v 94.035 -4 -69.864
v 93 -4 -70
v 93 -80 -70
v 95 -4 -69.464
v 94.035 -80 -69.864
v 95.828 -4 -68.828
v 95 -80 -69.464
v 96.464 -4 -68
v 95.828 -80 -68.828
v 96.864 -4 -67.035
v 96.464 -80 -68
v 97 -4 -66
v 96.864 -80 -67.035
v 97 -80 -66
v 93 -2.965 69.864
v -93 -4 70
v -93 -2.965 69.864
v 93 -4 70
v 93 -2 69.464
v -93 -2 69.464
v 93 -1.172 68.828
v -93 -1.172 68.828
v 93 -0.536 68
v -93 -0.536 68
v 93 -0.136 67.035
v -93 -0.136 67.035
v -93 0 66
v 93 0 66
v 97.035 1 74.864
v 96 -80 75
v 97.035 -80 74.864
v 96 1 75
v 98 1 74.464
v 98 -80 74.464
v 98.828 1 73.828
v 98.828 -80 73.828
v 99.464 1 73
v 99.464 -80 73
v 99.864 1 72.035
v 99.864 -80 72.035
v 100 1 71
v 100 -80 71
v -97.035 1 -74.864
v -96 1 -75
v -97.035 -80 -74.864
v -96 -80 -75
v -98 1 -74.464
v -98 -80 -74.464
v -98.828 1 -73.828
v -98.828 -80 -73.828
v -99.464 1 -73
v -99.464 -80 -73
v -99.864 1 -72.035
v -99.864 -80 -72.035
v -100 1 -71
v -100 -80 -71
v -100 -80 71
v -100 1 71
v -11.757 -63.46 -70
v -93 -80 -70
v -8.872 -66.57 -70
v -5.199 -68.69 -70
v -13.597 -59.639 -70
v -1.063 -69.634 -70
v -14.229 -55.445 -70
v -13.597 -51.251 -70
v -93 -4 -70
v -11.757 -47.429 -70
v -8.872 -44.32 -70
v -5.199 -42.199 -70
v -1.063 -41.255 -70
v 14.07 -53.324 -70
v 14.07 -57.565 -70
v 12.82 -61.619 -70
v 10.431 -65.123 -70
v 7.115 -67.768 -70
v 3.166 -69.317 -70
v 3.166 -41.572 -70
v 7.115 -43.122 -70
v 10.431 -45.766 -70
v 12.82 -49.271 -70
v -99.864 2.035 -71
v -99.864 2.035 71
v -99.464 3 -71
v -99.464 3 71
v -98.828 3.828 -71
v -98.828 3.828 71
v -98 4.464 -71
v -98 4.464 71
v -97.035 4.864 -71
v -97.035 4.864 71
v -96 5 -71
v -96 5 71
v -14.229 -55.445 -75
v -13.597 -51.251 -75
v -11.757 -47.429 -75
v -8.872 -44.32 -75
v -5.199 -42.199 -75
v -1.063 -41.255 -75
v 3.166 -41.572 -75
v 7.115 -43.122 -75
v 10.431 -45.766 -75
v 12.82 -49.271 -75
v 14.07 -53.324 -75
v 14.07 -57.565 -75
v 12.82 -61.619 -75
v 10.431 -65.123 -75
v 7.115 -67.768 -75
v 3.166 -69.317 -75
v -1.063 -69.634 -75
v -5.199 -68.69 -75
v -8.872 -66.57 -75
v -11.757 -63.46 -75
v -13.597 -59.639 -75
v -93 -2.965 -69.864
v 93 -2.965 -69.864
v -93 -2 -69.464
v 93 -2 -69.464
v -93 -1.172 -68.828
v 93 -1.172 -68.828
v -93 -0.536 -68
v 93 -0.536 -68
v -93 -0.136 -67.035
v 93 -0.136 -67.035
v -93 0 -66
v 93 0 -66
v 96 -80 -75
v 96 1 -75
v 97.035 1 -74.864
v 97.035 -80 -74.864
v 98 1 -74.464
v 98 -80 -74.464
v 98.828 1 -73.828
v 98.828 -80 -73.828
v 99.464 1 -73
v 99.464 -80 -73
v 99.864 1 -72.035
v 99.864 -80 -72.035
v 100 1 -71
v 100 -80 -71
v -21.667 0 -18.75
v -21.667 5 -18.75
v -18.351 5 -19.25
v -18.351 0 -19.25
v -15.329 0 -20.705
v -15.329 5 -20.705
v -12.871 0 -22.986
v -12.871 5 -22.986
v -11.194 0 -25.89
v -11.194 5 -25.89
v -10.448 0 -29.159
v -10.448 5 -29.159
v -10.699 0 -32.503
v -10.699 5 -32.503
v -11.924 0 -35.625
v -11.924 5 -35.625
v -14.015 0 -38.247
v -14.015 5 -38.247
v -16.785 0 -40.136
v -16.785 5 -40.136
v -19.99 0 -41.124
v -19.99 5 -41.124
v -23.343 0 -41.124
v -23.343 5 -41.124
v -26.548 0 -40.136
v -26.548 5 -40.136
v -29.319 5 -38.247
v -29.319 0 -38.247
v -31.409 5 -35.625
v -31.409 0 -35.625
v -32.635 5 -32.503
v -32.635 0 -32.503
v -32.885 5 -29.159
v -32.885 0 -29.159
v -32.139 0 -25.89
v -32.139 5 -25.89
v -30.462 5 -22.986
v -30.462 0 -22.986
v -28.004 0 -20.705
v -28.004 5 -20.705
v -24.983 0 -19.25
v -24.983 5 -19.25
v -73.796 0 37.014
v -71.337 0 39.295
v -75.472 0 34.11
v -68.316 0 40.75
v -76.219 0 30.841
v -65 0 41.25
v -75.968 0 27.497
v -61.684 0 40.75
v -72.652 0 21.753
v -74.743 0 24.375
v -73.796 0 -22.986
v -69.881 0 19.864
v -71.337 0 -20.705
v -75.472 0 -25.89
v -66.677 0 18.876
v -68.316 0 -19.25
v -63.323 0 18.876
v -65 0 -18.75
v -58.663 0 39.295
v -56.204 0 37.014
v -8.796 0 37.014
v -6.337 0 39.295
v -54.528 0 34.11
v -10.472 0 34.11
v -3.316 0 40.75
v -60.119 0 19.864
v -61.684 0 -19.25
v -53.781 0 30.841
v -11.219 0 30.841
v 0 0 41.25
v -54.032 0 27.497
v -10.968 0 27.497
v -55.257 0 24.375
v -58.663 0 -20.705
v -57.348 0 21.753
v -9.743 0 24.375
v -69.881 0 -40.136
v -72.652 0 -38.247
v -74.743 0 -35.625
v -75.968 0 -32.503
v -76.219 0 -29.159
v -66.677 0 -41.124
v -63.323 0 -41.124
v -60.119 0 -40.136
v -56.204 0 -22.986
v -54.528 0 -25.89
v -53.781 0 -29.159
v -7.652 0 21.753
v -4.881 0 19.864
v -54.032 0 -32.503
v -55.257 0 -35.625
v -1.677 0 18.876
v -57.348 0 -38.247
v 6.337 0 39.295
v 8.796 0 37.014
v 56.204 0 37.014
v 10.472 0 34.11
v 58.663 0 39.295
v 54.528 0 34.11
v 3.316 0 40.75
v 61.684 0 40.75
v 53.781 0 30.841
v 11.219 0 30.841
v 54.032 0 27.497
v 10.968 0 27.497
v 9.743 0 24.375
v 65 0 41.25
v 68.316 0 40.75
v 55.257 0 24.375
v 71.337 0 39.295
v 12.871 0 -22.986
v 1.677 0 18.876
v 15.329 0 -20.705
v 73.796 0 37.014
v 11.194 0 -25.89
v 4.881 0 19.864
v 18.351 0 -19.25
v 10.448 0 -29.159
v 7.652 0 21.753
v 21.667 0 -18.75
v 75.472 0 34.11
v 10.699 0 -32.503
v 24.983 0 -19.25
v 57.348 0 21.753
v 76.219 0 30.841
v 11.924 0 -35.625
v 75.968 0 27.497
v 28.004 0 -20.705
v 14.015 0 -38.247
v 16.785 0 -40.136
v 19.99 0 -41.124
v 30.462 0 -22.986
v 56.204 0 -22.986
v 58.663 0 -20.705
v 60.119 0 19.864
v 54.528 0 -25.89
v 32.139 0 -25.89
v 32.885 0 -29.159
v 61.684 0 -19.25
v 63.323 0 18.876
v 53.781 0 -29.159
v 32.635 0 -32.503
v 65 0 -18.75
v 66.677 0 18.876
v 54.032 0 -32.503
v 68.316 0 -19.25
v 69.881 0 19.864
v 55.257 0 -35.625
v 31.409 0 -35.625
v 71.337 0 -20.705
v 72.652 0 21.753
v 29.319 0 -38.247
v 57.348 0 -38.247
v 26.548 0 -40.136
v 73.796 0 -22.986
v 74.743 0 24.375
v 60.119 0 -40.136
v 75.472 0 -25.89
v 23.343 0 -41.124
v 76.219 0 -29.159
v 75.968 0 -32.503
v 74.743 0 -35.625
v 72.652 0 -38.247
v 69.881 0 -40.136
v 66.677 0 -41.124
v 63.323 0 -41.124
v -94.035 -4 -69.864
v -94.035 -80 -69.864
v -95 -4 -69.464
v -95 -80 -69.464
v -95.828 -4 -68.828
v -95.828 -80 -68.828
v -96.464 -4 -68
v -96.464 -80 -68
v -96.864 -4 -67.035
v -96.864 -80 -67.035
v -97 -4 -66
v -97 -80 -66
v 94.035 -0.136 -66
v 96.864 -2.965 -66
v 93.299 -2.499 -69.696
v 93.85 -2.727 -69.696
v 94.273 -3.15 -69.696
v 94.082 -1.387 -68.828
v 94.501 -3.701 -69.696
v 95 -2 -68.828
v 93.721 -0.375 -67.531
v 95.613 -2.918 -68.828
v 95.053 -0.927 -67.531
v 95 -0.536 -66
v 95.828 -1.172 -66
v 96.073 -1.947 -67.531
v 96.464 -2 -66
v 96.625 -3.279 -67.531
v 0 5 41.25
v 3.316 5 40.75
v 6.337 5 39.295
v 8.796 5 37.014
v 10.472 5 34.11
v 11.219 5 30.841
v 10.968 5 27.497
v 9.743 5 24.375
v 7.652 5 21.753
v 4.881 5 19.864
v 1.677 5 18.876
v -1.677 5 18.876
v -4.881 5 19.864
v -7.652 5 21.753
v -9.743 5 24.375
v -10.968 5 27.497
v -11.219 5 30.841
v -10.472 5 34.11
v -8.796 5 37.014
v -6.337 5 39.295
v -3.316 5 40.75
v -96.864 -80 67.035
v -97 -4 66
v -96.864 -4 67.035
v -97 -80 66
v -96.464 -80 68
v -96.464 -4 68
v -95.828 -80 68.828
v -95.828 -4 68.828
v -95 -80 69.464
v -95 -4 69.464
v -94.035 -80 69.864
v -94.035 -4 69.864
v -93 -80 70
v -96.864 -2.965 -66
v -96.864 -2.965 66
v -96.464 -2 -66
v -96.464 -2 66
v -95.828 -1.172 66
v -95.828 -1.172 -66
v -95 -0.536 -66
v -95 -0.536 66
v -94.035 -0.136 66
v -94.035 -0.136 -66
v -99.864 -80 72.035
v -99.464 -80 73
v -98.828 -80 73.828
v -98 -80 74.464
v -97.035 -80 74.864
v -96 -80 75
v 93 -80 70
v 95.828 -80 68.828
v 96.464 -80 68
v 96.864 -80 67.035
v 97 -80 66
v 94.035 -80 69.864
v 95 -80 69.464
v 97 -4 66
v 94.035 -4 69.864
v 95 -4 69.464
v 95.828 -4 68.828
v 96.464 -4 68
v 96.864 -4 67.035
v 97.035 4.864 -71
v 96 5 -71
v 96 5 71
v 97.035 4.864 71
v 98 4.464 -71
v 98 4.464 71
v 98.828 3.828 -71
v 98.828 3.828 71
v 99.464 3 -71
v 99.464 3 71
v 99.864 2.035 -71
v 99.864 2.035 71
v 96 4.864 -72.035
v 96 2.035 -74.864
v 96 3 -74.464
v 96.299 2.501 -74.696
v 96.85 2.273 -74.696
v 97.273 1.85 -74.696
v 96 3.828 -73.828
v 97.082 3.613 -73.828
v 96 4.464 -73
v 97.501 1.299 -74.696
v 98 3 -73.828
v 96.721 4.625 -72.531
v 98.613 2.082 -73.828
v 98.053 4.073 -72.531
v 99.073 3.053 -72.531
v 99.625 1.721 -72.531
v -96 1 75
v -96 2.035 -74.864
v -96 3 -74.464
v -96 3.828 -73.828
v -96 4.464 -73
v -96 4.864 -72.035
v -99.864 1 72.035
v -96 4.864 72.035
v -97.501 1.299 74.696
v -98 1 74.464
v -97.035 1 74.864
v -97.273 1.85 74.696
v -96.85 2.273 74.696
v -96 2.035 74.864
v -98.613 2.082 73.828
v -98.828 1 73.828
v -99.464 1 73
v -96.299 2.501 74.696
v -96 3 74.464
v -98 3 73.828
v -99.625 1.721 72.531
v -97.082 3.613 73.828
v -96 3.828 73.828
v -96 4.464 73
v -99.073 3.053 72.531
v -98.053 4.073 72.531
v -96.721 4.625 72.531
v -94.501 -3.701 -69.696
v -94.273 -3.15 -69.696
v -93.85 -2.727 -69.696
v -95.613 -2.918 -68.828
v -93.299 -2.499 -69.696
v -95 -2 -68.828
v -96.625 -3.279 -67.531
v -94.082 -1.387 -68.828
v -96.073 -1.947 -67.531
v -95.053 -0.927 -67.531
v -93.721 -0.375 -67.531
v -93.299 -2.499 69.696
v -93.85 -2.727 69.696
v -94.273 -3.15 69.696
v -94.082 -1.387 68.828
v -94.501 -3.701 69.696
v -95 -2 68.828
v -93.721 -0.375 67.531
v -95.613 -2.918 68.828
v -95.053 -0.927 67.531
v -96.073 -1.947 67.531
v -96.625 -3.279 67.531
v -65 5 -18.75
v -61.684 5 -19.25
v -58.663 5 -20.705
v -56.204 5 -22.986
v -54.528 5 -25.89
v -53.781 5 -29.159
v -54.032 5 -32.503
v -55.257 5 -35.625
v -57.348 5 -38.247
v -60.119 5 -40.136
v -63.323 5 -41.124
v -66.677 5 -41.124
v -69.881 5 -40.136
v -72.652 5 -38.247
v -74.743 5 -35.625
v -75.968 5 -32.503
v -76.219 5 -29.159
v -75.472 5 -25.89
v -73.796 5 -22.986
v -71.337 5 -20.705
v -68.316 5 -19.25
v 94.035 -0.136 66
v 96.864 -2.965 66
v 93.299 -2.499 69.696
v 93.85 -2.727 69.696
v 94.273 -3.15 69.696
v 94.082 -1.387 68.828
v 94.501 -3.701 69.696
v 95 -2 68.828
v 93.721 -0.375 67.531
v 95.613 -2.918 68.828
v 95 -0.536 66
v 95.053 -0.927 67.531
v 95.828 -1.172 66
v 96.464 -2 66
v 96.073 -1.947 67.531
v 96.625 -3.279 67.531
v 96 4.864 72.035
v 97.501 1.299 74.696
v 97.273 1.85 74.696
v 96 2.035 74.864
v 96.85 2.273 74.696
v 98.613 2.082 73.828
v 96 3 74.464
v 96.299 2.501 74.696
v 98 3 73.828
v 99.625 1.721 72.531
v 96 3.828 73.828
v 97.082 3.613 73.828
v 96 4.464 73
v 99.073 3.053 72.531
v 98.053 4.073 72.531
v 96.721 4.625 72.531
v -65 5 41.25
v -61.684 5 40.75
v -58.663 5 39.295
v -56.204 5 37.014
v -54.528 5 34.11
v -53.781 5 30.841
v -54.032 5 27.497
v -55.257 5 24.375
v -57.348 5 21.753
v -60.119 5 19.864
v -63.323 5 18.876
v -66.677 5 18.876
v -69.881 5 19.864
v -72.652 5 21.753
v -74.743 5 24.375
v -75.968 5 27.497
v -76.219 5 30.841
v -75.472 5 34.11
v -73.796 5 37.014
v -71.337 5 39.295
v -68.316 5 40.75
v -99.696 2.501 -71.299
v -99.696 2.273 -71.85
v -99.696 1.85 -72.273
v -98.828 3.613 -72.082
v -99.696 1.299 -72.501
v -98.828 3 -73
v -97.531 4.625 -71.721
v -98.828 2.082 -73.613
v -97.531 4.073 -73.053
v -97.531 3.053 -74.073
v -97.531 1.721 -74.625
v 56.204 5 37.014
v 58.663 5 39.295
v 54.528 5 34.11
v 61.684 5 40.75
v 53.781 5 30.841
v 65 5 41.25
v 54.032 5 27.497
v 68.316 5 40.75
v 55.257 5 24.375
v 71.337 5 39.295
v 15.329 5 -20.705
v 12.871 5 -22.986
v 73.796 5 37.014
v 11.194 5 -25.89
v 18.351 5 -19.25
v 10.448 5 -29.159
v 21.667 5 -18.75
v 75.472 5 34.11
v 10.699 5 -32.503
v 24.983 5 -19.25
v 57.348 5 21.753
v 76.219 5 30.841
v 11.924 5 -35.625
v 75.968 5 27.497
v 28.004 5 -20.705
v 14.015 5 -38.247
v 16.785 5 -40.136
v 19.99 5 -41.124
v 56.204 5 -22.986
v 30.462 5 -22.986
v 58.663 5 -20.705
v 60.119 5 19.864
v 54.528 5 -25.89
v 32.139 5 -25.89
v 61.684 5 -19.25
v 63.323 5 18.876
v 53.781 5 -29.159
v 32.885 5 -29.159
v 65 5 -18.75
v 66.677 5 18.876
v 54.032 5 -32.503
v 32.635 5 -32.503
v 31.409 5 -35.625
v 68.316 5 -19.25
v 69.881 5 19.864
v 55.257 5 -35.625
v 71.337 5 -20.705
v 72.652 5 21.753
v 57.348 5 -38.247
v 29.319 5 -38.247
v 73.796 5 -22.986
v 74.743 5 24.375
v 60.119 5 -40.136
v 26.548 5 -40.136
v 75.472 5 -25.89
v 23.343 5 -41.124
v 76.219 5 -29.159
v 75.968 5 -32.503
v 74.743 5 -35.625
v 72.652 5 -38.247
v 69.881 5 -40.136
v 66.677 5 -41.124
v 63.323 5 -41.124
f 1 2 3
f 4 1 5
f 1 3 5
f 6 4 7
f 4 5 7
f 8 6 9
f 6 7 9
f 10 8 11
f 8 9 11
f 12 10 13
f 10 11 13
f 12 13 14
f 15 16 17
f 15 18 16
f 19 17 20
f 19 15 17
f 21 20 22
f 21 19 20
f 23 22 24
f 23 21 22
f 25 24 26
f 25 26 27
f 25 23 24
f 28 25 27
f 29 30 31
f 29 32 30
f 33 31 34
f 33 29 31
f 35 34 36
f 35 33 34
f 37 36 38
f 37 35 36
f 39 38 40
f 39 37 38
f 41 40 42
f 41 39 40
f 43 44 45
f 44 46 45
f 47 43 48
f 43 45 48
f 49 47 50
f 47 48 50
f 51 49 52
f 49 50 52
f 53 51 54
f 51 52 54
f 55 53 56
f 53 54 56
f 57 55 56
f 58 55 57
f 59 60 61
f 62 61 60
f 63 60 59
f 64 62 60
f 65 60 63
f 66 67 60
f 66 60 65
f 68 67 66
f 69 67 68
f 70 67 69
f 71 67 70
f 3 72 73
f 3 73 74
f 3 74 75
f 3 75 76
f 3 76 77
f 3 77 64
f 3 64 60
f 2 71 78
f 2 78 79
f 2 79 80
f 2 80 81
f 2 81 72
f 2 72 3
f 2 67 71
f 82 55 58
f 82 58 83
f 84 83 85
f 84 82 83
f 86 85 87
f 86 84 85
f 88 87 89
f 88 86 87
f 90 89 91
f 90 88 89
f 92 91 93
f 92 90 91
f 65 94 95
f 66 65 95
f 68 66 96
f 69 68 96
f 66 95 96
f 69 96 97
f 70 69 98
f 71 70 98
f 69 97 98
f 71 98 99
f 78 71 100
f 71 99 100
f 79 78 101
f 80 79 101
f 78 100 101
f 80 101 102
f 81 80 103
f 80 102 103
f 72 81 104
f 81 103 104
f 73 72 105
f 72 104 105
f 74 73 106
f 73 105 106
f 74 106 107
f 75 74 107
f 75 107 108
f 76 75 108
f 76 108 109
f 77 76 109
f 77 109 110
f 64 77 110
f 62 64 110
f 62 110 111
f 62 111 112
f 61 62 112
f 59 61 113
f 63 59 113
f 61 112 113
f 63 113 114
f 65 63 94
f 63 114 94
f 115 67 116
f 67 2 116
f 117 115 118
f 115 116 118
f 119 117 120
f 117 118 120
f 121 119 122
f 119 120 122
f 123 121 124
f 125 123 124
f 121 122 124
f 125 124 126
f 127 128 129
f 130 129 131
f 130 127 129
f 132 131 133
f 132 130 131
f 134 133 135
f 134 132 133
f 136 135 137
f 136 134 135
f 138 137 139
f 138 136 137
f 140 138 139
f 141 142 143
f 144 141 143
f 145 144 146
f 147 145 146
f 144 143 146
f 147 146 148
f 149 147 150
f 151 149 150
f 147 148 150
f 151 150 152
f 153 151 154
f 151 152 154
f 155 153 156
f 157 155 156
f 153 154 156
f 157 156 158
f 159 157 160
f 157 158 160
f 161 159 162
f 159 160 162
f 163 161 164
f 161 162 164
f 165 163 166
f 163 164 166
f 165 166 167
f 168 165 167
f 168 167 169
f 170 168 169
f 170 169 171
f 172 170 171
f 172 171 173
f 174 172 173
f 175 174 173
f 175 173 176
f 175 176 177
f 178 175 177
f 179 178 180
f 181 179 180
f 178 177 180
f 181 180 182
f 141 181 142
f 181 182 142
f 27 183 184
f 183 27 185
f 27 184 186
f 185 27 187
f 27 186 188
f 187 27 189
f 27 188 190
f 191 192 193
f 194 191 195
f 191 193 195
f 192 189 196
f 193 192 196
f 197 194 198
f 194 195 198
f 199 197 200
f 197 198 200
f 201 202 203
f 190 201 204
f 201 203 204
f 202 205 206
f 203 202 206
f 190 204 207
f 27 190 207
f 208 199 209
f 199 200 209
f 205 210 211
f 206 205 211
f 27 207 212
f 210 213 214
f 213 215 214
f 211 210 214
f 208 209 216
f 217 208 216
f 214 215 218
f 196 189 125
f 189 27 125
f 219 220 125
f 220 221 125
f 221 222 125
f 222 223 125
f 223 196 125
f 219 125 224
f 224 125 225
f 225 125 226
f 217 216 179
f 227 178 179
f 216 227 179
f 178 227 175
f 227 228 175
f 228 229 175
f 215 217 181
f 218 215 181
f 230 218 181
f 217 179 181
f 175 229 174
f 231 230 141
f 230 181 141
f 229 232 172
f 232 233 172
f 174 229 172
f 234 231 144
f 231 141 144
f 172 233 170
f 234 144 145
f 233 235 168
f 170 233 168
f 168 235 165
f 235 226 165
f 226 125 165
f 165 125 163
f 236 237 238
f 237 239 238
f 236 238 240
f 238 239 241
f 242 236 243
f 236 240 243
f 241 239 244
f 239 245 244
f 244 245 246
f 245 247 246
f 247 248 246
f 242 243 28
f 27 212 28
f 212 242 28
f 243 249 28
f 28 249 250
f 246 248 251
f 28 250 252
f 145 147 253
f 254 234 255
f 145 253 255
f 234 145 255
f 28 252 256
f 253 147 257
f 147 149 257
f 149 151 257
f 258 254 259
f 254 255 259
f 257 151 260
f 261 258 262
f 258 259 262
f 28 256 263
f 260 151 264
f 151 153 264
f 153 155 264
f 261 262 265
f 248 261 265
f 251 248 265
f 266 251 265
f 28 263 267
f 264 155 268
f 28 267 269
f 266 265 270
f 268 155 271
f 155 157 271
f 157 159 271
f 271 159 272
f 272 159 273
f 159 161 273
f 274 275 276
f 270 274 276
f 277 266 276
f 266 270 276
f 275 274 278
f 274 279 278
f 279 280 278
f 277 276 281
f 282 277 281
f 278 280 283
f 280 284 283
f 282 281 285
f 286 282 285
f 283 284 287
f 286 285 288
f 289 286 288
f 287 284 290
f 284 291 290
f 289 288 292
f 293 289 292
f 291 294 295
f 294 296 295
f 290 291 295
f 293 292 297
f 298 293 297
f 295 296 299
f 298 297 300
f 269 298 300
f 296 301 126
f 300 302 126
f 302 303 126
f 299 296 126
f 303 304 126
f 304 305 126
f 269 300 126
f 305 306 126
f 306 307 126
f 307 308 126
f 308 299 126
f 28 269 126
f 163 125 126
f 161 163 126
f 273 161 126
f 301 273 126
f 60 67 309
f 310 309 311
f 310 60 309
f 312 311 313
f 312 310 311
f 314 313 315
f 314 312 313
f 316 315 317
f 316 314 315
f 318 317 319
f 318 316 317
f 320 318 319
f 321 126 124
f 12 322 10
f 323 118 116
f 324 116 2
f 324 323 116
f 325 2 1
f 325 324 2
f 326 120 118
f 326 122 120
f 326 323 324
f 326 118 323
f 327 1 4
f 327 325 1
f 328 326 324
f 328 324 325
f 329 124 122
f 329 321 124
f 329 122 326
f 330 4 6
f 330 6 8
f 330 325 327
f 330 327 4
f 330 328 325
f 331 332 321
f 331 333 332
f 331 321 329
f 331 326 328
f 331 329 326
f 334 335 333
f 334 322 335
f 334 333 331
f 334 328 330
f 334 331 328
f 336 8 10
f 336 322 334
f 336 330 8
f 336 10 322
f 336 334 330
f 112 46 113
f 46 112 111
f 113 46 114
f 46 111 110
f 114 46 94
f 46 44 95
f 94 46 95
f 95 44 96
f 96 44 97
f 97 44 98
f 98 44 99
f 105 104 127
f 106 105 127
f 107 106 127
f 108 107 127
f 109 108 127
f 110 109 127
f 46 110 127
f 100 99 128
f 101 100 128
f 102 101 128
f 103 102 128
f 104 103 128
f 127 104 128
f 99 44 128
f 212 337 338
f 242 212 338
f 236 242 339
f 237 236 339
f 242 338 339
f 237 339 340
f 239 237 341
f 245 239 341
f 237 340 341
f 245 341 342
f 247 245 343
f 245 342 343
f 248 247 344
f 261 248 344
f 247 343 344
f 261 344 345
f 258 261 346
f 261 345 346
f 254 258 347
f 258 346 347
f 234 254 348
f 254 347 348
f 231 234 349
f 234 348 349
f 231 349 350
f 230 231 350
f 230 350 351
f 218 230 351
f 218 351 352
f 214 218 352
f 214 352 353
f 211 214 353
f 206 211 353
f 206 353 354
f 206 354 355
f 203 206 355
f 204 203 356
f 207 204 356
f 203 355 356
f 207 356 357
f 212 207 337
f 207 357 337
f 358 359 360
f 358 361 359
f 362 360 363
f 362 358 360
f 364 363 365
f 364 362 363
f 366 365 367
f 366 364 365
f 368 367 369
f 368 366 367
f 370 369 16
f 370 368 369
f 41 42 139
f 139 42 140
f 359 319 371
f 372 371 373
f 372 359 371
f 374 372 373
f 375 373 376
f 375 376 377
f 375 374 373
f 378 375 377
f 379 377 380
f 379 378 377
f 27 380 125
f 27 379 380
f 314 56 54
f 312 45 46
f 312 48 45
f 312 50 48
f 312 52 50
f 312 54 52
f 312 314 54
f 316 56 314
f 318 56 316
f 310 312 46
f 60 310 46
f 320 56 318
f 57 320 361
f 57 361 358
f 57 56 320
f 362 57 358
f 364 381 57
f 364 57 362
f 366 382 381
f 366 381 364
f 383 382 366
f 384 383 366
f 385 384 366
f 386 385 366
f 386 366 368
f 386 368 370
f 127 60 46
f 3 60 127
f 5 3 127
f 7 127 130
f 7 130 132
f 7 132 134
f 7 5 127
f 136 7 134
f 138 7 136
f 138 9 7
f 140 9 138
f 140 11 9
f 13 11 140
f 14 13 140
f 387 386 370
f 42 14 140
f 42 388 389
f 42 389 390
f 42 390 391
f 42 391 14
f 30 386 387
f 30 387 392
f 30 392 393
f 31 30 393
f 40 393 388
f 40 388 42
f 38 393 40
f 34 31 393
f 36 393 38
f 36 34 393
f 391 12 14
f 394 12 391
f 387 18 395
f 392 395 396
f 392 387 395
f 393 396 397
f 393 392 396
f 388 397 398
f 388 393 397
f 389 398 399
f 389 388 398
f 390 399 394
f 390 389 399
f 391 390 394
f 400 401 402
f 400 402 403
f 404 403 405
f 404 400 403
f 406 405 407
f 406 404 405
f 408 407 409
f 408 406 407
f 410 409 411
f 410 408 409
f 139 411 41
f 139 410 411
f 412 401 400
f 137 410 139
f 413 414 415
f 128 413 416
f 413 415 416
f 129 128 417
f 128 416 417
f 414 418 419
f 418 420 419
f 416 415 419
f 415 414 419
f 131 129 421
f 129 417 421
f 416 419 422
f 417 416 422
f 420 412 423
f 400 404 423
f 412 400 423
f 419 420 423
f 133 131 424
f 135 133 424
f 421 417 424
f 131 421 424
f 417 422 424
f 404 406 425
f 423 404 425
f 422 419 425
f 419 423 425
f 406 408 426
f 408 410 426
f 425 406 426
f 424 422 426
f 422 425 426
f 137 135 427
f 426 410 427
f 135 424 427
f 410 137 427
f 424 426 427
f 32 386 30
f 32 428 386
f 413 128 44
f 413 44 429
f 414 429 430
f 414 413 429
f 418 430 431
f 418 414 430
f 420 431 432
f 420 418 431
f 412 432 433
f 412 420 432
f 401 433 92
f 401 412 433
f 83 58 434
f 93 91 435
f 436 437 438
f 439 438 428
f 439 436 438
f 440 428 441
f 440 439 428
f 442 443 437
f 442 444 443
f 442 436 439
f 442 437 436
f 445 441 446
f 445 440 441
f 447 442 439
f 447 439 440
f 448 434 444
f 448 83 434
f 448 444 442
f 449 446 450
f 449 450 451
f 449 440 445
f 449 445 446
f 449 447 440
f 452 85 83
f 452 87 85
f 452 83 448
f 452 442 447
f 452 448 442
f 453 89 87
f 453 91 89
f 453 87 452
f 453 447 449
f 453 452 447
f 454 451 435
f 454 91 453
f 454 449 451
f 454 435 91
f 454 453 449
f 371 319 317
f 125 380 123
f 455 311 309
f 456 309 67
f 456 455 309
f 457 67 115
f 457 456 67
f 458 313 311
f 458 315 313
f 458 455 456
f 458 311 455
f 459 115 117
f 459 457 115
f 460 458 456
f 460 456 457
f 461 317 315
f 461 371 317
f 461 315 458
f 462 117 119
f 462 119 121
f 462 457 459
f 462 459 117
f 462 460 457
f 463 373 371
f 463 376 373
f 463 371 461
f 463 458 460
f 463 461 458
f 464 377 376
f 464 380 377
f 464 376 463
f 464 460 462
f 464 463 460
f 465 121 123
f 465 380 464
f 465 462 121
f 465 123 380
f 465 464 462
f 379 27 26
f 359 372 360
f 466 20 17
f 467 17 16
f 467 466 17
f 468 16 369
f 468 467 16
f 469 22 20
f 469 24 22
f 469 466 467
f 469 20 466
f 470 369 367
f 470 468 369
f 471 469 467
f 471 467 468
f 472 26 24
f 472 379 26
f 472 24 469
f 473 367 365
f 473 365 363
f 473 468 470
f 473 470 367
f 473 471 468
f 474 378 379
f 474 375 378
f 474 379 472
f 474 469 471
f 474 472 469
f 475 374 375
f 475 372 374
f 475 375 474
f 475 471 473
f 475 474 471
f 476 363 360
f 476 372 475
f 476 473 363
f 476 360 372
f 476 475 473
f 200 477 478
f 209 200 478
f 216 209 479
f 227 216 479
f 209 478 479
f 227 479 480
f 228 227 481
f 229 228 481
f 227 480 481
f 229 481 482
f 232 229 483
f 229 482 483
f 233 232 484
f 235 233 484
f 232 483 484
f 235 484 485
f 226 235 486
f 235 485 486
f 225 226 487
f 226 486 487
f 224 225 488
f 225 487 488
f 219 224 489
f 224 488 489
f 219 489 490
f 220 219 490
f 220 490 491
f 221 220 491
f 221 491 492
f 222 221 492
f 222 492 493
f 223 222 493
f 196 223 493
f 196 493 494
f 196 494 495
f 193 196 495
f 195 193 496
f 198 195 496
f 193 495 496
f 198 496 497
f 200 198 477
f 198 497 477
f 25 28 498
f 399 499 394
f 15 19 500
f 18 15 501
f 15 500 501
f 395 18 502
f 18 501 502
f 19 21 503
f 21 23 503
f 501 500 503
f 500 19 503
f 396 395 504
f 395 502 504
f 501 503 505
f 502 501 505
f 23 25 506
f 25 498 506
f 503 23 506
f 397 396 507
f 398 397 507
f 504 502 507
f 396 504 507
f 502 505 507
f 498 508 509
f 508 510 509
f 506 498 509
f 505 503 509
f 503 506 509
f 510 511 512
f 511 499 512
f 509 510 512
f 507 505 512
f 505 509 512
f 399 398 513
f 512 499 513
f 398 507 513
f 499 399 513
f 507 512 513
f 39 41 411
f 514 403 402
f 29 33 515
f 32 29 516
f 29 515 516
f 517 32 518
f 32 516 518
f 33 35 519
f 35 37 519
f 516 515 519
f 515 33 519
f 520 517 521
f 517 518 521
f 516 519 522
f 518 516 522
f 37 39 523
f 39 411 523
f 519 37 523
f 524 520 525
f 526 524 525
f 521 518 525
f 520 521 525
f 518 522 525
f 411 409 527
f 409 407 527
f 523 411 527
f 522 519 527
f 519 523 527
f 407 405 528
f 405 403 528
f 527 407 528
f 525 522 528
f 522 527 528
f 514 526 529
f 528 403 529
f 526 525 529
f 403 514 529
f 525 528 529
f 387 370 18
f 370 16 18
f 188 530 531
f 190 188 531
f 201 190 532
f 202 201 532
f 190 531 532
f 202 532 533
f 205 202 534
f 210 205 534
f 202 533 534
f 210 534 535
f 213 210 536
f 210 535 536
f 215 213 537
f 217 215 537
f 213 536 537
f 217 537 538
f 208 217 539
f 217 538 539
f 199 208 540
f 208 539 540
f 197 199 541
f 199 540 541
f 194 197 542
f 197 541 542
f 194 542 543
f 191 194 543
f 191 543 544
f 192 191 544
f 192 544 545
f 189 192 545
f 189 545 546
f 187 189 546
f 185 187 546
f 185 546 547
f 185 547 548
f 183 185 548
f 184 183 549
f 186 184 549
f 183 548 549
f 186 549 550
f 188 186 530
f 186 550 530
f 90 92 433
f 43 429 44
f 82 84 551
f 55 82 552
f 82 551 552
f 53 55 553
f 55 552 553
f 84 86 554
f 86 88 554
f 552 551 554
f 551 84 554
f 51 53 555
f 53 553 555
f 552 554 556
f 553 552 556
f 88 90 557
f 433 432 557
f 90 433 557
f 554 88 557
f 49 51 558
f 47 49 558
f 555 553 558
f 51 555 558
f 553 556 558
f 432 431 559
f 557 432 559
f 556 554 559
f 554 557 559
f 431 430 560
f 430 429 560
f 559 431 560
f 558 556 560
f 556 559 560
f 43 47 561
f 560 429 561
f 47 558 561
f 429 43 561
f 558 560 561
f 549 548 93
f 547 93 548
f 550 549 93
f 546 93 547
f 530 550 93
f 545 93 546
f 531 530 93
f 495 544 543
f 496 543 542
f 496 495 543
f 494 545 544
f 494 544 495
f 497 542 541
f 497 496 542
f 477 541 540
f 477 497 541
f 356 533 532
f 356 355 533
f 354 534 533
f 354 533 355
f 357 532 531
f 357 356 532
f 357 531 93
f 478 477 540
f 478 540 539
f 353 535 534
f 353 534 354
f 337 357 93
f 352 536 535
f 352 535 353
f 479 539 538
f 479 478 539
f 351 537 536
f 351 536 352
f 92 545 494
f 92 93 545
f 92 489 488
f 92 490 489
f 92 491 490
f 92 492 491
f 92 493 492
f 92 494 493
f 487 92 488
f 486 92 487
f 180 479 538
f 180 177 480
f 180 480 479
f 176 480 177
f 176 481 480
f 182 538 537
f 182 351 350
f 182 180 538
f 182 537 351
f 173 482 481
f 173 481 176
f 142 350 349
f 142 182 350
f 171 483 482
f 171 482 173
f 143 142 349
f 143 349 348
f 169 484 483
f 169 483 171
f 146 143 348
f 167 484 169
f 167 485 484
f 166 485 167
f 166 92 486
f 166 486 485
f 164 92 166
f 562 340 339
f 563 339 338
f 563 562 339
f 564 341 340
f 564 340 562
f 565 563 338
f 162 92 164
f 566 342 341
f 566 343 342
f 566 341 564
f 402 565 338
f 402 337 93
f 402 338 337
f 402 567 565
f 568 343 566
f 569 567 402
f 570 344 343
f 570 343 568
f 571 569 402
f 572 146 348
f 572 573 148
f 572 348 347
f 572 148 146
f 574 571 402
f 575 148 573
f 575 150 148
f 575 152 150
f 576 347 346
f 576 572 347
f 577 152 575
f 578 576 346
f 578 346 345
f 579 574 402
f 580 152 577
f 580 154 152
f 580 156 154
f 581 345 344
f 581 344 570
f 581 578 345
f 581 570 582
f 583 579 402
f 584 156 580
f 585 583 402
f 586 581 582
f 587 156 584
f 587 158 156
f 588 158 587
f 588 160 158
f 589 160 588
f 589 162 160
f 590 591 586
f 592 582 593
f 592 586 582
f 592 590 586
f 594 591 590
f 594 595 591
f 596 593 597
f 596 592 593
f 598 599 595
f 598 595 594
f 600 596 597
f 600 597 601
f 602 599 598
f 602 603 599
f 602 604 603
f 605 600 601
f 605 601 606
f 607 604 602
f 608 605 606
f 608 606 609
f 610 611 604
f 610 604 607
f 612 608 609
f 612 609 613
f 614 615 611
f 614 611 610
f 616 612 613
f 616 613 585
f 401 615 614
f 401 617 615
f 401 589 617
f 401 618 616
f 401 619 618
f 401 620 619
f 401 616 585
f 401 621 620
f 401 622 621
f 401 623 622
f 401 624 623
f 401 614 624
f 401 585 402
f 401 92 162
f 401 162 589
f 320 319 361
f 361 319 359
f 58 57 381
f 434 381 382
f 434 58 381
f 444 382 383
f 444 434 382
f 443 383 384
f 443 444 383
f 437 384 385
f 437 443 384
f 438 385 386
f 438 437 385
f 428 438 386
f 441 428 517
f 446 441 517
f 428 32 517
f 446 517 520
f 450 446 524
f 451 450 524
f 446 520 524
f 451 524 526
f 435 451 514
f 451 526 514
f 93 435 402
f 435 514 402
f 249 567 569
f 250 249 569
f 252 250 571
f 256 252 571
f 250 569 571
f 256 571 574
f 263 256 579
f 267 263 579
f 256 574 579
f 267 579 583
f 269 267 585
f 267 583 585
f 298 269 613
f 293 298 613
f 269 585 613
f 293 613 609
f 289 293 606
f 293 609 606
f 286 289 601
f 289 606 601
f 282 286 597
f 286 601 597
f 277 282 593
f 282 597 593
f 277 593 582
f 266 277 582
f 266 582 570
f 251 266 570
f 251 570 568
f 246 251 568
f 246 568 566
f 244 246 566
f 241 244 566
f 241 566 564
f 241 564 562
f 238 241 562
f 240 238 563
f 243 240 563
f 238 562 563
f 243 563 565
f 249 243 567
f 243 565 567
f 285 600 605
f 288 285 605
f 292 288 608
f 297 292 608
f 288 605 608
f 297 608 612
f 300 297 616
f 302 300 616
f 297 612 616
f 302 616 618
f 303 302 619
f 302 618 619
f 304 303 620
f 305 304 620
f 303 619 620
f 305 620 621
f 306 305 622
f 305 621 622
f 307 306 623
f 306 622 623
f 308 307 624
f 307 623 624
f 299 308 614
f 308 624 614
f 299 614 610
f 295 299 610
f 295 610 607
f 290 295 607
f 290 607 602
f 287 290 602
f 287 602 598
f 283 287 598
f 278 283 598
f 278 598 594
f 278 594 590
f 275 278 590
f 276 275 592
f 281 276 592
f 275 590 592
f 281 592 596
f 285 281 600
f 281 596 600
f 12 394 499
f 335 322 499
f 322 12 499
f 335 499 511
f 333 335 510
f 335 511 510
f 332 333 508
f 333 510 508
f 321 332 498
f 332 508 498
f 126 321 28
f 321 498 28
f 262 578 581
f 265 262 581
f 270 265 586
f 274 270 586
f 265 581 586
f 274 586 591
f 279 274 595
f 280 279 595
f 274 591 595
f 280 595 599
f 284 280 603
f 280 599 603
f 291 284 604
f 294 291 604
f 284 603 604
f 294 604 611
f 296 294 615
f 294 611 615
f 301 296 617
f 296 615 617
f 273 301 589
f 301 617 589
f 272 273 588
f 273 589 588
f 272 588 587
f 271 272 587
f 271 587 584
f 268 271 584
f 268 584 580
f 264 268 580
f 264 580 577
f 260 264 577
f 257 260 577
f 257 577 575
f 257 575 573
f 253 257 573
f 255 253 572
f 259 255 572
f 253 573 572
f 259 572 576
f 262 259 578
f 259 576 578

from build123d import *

# Parameters (mm, degrees)
ESBO_O1_W                = 200
ESBO_O1_H                = 150
RESSALTO_EXTRUS_O1_DEPTH = 5
ESBO_O2_W                = 3
ESBO_O2_H                = 150
RESSALTO_EXTRUS_O2_DEPTH = 80
ESBO_O3_R                = 11.25
CORTE_EXTRUS_O1_DEPTH    = 5
ESBO_O6_W                = 194
ESBO_O6_H                = 5
RESSALTO_EXTRUS_O3_DEPTH = 80
FILETE2_R                = 4
FILETE3_R                = 4
ESBO_O12_R               = 14.229327837
CORTE_EXTRUS_O3_DEPTH    = 5


with BuildPart() as part:
    # Esboço1 → Ressalto-extrusão1 (new body)
    with BuildSketch(Plane(origin=(0, 0, 0), x_dir=(1, 0, 0), z_dir=(0, 1, 0))):
        Rectangle(ESBO_O1_W, ESBO_O1_H)
    extrude(amount=RESSALTO_EXTRUS_O1_DEPTH)

    # Esboço2 → Ressalto-extrusão2 (add)
    with BuildSketch(Plane.XZ):
        with Locations((-98.5, 0)):
            Rectangle(ESBO_O2_W, ESBO_O2_H)
        with Locations((98.5, 0)):
            Rectangle(ESBO_O2_W, ESBO_O2_H)
    extrude(amount=RESSALTO_EXTRUS_O2_DEPTH)

    # Esboço3 → Corte-extrusão1 (cut)
    with BuildSketch(Plane(origin=(0, 5, 0), x_dir=(1, 0, 0), z_dir=(0, 1, 0))):
        with Locations(Location((-65, 30, 0), (0, 0, 270))):
            Circle(ESBO_O3_R)
        with Locations(Location((-21.666666667, 30, 0), (0, 0, 270))):
            Circle(ESBO_O3_R)
        with Locations(Location((21.666666667, 30, 0), (0, 0, 270))):
            Circle(ESBO_O3_R)
        with Locations(Location((65, 30, 0), (0, 0, 270))):
            Circle(ESBO_O3_R)
        with Locations(Location((-65, -30, 0), (0, 0, 270))):
            Circle(ESBO_O3_R)
        with Locations(Location((0, -30, 0), (0, 0, 270))):
            Circle(ESBO_O3_R)
        with Locations(Location((65, -30, 0), (0, 0, 270))):
            Circle(ESBO_O3_R)
    extrude(amount=-CORTE_EXTRUS_O1_DEPTH, mode=Mode.SUBTRACT)

    # Esboço6 → Ressalto-extrusão3 (add)
    with BuildSketch(Plane.XZ):
        with Locations((0, -72.5)):
            Rectangle(ESBO_O6_W, ESBO_O6_H)
        with Locations((0, 72.5)):
            Rectangle(ESBO_O6_W, ESBO_O6_H)
    extrude(amount=RESSALTO_EXTRUS_O3_DEPTH)

    # Filete2
    filete2_edges = [part.edges().sort_by_distance(p)[0] for p in [
        (100, 5, 0),
        (0, 5, -75),
        (-100, 5, 0),
        (-100, -37.5, -75),
        (100, -37.5, -75),
        (100, -37.5, 75),
        (-100, -37.5, 75),
        (0, 5, 75),
    ]]
    fillet(filete2_edges, radius=FILETE2_R)

    # Filete3
    filete3_edges = [part.edges().sort_by_distance(p)[0] for p in [
        (-97, 0, 0),
        (97, 0, 0),
        (-97, -40, -70),
        (0, 0, -70),
        (97, -40, -70),
        (0, 0, 70),
        (-97, -40, 70),
        (97, -40, 70),
    ]]
    fillet(filete3_edges, radius=FILETE3_R)

    # Esboço12 → Corte-extrusão3 (cut)
    with BuildSketch(Plane(origin=(0, 0, -75), x_dir=(-1, 0, 0), z_dir=(0, 0, -1))):
        with Locations((0, -55.444674629)):
            Circle(ESBO_O12_R)
    extrude(amount=-CORTE_EXTRUS_O3_DEPTH, mode=Mode.SUBTRACT)


solid = part.part
